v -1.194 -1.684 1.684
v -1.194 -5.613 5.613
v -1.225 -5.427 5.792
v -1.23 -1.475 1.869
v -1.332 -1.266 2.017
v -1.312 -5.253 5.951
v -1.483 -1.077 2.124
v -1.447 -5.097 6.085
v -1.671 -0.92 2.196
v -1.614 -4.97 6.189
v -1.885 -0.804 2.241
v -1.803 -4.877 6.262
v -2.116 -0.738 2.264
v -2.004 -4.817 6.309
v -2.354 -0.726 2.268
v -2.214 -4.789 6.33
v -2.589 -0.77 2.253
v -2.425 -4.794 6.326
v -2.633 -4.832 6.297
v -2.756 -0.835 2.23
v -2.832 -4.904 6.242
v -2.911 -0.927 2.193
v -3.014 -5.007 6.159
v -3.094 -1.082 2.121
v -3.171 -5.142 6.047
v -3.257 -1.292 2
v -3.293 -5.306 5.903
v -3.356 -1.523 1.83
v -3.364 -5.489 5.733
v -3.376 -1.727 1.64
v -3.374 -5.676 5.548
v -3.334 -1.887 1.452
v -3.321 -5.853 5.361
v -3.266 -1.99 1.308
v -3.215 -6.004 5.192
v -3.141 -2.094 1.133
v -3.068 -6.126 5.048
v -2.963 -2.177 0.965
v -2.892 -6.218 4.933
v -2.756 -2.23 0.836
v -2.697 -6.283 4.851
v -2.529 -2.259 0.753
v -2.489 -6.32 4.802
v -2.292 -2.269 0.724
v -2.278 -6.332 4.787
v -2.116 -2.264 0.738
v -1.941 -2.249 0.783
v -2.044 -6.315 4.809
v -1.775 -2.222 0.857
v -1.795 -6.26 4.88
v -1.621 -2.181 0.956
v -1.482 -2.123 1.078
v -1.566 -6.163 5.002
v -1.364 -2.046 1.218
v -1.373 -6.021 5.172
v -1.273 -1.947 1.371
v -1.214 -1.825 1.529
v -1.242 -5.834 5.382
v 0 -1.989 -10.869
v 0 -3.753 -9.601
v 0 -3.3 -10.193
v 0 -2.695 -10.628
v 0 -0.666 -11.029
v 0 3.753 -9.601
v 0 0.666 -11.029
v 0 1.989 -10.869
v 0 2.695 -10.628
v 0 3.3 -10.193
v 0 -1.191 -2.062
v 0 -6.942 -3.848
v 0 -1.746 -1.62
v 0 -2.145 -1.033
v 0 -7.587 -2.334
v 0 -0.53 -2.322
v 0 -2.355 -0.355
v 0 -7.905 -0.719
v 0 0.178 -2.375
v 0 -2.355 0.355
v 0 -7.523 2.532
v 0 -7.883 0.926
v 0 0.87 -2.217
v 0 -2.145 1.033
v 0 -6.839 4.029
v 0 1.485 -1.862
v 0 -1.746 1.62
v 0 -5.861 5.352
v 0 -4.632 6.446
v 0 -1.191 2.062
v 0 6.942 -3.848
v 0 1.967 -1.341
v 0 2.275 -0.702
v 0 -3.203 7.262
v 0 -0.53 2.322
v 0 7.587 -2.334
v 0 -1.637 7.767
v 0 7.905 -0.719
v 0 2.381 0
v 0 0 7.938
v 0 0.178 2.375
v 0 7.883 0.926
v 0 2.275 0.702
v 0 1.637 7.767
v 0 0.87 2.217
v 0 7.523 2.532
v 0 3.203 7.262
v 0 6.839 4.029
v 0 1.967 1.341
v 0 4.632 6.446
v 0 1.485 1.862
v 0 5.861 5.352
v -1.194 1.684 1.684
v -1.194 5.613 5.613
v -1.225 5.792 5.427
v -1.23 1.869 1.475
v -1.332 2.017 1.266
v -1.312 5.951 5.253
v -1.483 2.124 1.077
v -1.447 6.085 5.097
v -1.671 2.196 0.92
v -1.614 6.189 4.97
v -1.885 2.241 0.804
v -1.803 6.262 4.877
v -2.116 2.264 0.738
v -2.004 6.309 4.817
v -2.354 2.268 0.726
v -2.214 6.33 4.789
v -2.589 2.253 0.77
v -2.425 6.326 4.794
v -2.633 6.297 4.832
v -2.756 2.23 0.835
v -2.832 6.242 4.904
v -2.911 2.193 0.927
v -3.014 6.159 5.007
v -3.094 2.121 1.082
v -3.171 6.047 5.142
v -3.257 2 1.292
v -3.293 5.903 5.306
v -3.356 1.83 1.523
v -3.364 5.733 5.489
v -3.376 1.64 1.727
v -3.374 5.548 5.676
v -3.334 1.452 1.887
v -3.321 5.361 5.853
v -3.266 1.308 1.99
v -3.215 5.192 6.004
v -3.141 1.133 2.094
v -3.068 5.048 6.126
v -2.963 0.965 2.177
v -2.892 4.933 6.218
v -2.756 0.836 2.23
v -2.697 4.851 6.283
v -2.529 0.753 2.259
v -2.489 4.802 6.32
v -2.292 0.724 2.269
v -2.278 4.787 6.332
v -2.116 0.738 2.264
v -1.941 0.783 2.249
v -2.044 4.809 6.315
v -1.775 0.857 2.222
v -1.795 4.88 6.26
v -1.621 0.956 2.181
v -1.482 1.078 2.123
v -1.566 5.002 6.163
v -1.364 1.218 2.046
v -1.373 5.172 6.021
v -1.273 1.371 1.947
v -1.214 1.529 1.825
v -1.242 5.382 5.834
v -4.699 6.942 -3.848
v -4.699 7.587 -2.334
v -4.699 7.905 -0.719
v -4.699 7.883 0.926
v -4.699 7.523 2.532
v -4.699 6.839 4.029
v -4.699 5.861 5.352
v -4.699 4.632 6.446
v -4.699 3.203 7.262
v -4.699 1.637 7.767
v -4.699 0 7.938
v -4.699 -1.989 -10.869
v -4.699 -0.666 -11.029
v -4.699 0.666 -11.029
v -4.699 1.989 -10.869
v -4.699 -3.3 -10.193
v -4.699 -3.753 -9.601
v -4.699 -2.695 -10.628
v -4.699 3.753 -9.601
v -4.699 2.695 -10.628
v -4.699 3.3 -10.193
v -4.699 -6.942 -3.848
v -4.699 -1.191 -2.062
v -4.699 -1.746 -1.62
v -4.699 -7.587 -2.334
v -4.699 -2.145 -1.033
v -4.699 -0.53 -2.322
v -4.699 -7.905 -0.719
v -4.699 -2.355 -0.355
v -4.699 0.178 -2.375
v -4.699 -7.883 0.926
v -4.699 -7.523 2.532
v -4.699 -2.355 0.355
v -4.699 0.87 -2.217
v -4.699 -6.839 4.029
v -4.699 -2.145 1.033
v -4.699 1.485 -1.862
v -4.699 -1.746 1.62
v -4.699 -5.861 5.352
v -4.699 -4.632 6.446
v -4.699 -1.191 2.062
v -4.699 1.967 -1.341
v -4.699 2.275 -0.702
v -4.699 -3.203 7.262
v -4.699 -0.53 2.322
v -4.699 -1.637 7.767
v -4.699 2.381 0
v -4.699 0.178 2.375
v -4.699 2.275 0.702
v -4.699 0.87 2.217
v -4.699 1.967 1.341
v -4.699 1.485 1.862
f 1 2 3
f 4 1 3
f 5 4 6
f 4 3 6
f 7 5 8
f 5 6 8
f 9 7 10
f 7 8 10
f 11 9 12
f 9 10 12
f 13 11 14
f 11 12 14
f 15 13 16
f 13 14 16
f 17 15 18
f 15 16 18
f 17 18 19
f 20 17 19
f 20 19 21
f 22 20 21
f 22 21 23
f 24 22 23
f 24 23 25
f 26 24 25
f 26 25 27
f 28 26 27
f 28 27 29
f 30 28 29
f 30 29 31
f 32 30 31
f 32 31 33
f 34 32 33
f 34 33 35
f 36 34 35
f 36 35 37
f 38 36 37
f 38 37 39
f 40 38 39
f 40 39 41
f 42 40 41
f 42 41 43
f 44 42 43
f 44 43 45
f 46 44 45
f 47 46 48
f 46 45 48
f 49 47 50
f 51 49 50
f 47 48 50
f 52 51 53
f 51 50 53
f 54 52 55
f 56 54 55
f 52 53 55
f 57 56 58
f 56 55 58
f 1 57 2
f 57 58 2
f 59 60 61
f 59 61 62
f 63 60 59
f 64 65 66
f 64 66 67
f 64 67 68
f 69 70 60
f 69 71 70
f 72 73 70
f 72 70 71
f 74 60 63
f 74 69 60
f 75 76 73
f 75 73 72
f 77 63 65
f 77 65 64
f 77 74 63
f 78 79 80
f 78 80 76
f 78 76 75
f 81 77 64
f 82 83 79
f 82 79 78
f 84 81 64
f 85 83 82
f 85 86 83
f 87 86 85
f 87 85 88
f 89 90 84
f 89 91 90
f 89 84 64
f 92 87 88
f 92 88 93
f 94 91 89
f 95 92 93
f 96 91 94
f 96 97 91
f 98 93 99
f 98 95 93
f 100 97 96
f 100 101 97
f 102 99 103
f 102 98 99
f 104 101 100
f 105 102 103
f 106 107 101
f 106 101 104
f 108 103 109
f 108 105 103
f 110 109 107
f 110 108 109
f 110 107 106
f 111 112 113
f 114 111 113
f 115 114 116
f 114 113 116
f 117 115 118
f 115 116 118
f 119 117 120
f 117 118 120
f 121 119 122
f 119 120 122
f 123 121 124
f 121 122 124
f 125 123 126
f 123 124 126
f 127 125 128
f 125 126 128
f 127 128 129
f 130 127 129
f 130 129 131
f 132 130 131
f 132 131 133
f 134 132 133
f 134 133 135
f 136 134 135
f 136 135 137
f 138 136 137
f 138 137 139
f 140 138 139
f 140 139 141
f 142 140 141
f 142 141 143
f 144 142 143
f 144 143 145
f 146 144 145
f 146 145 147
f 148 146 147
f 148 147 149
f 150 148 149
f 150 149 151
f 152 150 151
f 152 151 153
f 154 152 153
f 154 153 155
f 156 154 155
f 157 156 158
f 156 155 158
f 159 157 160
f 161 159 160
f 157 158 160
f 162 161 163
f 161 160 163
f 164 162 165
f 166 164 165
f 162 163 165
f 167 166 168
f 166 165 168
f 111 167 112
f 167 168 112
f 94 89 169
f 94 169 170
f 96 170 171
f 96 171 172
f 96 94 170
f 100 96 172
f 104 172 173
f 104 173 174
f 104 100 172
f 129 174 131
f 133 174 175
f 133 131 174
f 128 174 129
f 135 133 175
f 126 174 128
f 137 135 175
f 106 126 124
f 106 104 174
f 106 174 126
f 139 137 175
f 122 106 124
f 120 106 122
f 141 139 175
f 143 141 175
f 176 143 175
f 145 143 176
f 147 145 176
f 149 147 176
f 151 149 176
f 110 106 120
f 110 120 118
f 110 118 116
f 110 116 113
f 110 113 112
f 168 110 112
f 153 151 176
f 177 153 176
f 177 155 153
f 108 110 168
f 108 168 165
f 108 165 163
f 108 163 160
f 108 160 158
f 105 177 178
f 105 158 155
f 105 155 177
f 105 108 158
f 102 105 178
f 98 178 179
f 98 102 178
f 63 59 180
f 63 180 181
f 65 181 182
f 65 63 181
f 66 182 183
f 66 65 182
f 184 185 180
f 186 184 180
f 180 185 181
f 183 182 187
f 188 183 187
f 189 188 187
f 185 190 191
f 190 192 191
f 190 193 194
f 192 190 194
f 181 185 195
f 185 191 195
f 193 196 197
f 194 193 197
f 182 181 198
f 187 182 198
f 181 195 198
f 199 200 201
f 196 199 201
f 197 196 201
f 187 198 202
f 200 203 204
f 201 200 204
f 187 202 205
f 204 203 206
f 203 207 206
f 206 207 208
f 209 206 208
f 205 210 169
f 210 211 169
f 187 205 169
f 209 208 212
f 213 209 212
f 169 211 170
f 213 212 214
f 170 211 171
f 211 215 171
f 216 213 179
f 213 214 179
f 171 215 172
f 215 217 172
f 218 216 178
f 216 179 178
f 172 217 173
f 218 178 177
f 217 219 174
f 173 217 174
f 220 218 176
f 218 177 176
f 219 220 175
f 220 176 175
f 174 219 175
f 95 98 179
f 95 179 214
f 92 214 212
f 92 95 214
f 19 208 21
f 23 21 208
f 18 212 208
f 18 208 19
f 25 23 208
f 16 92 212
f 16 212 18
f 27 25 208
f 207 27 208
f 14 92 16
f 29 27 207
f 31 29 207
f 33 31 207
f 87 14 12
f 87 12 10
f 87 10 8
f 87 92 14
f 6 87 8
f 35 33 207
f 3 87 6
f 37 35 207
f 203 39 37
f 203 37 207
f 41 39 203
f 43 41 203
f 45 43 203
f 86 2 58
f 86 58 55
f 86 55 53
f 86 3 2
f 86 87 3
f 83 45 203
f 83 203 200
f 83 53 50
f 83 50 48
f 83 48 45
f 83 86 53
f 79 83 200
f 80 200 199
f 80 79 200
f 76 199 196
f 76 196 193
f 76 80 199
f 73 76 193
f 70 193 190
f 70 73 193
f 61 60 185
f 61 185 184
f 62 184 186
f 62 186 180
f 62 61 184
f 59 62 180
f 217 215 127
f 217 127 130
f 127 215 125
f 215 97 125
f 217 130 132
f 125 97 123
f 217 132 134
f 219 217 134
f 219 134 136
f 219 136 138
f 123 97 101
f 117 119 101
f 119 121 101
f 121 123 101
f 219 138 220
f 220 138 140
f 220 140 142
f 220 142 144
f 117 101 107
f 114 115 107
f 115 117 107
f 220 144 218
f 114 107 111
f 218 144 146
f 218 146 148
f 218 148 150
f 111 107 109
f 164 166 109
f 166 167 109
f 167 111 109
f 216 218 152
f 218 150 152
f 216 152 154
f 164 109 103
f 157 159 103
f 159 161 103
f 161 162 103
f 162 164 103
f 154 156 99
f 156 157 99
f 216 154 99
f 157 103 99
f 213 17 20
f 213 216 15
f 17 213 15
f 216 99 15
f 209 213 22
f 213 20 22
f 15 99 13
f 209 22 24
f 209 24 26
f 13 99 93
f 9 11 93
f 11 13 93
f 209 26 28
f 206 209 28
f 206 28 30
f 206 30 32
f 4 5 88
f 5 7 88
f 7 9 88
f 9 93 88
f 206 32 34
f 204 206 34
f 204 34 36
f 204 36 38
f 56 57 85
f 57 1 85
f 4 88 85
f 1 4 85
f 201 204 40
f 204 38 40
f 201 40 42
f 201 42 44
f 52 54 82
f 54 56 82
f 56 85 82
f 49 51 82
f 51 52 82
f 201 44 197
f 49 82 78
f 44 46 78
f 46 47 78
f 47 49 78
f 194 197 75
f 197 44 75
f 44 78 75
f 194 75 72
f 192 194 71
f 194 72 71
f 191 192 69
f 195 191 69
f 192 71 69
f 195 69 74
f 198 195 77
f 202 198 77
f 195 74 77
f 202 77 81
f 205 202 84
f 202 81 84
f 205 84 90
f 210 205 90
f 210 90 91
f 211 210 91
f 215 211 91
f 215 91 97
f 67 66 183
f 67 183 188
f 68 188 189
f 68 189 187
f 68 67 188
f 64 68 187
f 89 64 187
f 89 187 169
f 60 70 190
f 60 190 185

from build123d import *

# Parameters (mm, degrees)
F0_R     = 2.38125
F1_DEPTH = 4.699
F3_R     = 1.0922
F4_DEPTH = 7.62
F6_R     = 1.0922
F7_DEPTH = 7.62


with BuildPart() as f1:
    # F0 (on Right) → F1 (new body)
    with BuildSketch(Plane.YZ):
        with BuildLine():
            ThreePointArc((-3.753217, -9.601424), (-3.013341, -10.433085), (-1.988901, -10.868518))
            ThreePointArc((-1.988901, -10.868518), (0, -11.049), (1.988901, -10.868518))
            ThreePointArc((1.988901, -10.868518), (3.013341, -10.433085), (3.753217, -9.601424))
            Line((3.753217, -9.601424), (6.942294, -3.848176))
            ThreePointArc((6.942294, -3.848176), (6.839181, 4.028586), (0, 7.9375))
            ThreePointArc((0, 7.9375), (-6.839181, 4.028586), (-6.942294, -3.848176))
            Line((-6.942294, -3.848176), (-3.753217, -9.601424))
        make_face()
        Circle(F0_R, mode=Mode.SUBTRACT)
    extrude(amount=-F1_DEPTH)

    # F3 (on face) → F4 (cut)
    with BuildSketch(Plane(origin=(0, -5.61266, 5.61266), x_dir=(1, 0, 0), z_dir=(0, -0.707107, 0.707107))):
        with Locations((-2.286, 0)):
            Circle(F3_R)
    extrude(amount=-F4_DEPTH, mode=Mode.SUBTRACT)

    # F6 (on face) → F7 (cut)
    with BuildSketch(Plane(origin=(0, 5.61266, 5.61266), x_dir=(1, 0, 0), z_dir=(0, 0.707107, 0.707107))):
        with Locations((-2.286, 0)):
            Circle(F6_R)
    extrude(amount=-F7_DEPTH, mode=Mode.SUBTRACT)


solid = f1.part
